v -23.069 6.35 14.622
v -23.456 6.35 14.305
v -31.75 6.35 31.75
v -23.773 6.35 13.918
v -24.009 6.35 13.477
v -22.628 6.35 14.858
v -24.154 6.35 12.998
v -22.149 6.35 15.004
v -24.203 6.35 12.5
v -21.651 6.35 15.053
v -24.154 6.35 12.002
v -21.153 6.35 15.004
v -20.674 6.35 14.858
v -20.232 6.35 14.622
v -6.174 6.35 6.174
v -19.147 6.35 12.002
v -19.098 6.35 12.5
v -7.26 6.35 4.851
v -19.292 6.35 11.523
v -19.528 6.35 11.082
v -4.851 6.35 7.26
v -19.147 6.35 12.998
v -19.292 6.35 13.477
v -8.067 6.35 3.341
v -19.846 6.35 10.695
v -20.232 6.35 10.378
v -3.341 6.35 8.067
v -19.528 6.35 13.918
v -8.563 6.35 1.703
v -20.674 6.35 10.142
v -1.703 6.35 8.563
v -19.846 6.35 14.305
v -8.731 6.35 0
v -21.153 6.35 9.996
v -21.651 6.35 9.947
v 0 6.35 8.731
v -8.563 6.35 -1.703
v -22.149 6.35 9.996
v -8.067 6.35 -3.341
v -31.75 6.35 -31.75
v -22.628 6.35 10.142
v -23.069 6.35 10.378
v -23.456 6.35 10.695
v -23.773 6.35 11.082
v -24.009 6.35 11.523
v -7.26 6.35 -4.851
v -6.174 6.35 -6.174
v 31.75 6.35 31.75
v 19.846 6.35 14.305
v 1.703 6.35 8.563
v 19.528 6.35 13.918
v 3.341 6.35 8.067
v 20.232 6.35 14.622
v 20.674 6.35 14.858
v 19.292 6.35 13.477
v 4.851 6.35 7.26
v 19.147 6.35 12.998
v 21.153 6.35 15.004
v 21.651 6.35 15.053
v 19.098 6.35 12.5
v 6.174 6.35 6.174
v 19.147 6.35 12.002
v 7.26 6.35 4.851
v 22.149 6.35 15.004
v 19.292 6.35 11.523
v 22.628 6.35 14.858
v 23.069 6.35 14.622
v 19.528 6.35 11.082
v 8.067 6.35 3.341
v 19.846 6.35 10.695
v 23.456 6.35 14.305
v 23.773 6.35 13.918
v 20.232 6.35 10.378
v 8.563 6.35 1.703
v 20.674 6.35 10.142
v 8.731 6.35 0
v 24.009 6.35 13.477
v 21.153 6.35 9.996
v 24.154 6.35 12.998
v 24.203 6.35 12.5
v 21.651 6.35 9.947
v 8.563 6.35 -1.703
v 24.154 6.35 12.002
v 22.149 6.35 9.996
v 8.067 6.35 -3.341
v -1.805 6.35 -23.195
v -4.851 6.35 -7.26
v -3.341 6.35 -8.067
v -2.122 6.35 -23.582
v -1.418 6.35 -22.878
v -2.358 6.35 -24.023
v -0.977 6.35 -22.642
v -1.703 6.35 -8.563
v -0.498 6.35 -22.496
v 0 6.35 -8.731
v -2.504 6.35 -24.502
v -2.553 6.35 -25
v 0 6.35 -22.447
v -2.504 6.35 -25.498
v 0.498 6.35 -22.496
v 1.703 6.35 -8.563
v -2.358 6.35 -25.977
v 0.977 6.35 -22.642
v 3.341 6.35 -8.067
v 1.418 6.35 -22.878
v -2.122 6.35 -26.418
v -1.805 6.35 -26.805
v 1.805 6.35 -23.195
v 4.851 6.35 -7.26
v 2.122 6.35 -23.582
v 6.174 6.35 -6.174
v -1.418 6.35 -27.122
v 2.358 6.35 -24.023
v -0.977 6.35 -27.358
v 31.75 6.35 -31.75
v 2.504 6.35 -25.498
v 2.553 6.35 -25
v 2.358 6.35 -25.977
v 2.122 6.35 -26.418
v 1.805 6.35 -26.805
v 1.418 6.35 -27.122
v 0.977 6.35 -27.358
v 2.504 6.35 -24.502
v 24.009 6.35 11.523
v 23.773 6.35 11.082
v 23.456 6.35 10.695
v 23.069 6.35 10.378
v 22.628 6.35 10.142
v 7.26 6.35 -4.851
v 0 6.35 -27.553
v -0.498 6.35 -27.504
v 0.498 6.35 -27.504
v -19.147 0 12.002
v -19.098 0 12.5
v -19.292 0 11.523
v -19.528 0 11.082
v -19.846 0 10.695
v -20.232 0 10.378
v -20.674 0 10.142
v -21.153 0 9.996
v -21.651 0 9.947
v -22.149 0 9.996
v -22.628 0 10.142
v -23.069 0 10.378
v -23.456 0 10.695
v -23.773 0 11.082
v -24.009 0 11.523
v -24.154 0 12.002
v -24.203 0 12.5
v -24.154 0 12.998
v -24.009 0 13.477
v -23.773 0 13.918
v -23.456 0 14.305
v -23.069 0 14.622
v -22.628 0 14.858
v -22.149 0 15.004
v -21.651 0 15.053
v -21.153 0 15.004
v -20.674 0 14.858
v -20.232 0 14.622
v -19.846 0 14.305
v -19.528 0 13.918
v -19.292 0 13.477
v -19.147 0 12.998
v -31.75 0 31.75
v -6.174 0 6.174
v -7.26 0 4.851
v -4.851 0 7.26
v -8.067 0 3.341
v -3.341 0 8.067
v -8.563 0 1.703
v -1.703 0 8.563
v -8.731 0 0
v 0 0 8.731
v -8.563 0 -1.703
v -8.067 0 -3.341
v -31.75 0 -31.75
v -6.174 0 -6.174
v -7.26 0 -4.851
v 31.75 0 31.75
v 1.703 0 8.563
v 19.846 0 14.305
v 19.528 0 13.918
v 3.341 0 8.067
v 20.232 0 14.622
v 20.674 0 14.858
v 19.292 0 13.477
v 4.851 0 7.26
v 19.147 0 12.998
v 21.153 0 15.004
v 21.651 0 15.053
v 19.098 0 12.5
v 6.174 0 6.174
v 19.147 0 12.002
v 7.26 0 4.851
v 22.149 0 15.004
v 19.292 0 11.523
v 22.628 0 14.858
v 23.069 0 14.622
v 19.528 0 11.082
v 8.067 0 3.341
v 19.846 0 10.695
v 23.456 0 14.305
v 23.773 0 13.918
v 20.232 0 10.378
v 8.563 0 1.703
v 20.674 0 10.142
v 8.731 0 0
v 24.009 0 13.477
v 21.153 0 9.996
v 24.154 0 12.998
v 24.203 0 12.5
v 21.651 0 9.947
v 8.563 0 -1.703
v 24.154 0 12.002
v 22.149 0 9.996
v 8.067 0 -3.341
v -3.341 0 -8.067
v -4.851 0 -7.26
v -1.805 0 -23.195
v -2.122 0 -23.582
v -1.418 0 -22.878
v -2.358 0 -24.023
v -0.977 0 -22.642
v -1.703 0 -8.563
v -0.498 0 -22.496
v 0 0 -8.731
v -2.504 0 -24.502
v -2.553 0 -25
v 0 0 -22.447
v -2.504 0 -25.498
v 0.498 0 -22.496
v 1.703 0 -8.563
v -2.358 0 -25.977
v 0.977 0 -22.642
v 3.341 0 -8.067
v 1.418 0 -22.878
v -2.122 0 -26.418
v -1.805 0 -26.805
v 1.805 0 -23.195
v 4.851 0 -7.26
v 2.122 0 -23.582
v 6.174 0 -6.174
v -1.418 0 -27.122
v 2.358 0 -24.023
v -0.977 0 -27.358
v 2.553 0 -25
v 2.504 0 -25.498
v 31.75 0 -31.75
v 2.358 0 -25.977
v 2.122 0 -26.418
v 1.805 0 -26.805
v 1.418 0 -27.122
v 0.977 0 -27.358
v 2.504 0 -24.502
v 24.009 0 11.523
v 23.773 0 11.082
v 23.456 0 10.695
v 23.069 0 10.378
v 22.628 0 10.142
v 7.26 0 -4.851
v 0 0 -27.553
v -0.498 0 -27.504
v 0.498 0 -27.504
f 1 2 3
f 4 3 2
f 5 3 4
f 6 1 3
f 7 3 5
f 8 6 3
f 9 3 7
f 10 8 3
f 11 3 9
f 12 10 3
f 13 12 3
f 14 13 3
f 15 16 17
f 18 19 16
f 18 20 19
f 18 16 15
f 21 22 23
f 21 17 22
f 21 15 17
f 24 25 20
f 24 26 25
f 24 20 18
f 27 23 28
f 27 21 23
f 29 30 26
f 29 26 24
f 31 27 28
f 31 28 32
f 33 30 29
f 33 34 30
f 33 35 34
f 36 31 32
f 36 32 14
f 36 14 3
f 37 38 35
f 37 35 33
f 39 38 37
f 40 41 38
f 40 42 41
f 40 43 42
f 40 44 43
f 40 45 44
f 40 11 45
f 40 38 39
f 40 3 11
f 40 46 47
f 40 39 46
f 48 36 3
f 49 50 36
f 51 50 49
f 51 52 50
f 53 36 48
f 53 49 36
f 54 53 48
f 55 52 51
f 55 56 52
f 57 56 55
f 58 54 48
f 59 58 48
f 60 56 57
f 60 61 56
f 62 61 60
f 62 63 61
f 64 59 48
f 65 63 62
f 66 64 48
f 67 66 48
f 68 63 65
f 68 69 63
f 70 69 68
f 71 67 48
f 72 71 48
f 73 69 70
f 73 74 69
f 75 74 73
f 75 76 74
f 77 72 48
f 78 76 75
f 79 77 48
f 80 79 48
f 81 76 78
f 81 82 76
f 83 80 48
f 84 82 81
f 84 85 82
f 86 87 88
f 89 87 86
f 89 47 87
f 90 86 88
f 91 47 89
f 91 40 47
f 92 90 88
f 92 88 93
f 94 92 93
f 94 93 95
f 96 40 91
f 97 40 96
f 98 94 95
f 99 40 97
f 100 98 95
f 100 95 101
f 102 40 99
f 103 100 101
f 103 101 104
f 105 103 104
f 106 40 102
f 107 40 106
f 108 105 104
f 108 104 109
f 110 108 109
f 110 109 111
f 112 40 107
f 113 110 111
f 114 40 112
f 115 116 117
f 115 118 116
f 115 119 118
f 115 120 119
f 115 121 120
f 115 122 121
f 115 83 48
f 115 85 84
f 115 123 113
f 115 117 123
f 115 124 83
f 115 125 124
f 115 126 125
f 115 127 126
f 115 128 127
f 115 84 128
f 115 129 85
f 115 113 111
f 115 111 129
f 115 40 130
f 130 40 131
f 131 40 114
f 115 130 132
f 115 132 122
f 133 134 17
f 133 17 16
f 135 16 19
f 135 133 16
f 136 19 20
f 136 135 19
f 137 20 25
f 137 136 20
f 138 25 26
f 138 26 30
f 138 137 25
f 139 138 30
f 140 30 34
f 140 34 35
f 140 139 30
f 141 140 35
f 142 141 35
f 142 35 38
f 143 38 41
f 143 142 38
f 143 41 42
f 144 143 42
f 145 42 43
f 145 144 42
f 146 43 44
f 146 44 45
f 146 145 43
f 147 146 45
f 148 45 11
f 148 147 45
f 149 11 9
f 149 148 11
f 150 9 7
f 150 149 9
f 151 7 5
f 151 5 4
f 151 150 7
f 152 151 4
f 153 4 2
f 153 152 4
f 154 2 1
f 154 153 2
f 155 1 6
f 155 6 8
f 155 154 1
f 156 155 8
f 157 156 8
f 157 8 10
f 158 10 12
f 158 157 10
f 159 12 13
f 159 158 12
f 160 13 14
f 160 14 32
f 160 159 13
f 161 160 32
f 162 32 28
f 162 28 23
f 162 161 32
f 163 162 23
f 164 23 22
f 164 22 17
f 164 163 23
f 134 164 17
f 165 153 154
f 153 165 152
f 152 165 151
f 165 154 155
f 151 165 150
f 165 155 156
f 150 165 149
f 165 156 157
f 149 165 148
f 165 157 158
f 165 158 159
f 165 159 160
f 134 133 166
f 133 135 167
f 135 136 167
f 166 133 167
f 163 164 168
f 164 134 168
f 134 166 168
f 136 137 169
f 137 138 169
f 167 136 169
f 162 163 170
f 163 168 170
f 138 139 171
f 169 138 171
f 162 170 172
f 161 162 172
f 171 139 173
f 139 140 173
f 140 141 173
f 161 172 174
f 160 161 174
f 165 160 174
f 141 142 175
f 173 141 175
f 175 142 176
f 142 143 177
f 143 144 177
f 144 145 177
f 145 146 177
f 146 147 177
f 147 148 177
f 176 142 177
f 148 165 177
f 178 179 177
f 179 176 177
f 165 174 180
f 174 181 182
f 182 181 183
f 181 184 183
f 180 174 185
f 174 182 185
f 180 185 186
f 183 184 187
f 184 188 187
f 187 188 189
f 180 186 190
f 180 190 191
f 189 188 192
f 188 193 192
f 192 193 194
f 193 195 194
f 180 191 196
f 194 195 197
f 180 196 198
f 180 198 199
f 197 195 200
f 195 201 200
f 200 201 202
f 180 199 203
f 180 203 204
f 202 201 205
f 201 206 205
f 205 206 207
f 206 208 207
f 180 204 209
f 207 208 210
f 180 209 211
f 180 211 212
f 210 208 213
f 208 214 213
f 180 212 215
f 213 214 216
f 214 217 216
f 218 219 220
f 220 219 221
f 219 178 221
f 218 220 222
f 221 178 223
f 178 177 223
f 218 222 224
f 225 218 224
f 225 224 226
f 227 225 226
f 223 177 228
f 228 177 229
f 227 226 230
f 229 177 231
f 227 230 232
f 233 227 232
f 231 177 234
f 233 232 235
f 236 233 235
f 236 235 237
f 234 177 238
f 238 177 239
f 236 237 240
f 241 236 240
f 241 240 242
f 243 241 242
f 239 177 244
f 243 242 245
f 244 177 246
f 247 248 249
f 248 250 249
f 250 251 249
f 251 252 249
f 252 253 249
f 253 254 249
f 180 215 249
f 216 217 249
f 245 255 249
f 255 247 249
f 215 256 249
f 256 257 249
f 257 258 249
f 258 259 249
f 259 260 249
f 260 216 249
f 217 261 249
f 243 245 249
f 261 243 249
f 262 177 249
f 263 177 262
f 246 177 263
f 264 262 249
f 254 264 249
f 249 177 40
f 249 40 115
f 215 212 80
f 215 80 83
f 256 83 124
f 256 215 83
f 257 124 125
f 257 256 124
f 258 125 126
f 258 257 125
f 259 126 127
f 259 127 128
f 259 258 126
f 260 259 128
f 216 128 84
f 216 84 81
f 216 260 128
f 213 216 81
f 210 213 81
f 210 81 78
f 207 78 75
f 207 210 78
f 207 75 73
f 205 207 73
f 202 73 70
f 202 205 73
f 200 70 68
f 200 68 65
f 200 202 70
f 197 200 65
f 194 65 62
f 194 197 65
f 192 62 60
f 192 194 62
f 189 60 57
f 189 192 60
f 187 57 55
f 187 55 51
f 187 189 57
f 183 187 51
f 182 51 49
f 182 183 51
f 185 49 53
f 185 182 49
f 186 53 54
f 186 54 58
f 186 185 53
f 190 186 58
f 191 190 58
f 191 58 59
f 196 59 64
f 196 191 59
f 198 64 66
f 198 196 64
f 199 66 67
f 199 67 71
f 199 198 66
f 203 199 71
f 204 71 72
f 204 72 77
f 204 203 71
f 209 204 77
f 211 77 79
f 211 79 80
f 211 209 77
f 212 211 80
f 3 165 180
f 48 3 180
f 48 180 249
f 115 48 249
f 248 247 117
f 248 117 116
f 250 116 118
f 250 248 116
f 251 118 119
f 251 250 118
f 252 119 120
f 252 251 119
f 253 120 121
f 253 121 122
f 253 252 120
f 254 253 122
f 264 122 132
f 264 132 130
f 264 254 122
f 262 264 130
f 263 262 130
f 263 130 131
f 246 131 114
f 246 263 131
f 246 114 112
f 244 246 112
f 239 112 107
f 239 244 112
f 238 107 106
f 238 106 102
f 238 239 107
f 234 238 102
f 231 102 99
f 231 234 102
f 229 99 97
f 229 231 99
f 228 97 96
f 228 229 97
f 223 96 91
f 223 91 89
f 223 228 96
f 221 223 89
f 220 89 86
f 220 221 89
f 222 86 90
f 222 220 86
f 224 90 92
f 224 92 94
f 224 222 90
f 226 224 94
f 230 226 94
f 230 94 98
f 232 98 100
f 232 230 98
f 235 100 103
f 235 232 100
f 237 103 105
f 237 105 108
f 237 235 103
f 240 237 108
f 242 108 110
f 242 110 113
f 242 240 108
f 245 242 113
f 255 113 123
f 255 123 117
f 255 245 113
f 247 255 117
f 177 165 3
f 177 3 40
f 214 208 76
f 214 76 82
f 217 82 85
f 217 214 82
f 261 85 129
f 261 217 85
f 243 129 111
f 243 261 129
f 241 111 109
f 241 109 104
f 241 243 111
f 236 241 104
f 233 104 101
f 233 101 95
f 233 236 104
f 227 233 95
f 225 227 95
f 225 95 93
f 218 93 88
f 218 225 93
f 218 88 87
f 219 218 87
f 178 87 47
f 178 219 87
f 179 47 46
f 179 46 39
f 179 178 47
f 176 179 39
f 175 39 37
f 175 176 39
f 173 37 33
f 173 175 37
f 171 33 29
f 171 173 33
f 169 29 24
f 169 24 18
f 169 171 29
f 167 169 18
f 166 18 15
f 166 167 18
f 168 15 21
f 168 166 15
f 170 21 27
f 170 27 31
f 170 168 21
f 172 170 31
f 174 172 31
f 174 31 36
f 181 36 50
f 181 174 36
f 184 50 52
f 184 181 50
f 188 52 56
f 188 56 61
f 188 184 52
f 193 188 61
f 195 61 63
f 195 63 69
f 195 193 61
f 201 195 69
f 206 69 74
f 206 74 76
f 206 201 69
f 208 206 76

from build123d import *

# Parameters (mm, degrees)
SKETCH1_W           = 63.5
SKETCH1_H           = 63.5
SKETCH1_R           = 2.5527
SKETCH1_R_2         = 8.73125
BOSS_EXTRUDE1_DEPTH = 6.35


with BuildPart() as part:
    # Sketch1 → Boss-Extrude1 (new body)
    with BuildSketch(Plane(origin=(0, 0, 0), x_dir=(1, 0, 0), z_dir=(0, 1, 0))):
        Rectangle(SKETCH1_W, SKETCH1_H)
        with Locations((0, 25)):
            Circle(SKETCH1_R, mode=Mode.SUBTRACT)
        Circle(SKETCH1_R_2, mode=Mode.SUBTRACT)
        with Locations((21.650635095, -12.5)):
            Circle(SKETCH1_R, mode=Mode.SUBTRACT)
        with Locations((-21.650635095, -12.5)):
            Circle(SKETCH1_R, mode=Mode.SUBTRACT)
    extrude(amount=BOSS_EXTRUDE1_DEPTH)


solid = part.part
